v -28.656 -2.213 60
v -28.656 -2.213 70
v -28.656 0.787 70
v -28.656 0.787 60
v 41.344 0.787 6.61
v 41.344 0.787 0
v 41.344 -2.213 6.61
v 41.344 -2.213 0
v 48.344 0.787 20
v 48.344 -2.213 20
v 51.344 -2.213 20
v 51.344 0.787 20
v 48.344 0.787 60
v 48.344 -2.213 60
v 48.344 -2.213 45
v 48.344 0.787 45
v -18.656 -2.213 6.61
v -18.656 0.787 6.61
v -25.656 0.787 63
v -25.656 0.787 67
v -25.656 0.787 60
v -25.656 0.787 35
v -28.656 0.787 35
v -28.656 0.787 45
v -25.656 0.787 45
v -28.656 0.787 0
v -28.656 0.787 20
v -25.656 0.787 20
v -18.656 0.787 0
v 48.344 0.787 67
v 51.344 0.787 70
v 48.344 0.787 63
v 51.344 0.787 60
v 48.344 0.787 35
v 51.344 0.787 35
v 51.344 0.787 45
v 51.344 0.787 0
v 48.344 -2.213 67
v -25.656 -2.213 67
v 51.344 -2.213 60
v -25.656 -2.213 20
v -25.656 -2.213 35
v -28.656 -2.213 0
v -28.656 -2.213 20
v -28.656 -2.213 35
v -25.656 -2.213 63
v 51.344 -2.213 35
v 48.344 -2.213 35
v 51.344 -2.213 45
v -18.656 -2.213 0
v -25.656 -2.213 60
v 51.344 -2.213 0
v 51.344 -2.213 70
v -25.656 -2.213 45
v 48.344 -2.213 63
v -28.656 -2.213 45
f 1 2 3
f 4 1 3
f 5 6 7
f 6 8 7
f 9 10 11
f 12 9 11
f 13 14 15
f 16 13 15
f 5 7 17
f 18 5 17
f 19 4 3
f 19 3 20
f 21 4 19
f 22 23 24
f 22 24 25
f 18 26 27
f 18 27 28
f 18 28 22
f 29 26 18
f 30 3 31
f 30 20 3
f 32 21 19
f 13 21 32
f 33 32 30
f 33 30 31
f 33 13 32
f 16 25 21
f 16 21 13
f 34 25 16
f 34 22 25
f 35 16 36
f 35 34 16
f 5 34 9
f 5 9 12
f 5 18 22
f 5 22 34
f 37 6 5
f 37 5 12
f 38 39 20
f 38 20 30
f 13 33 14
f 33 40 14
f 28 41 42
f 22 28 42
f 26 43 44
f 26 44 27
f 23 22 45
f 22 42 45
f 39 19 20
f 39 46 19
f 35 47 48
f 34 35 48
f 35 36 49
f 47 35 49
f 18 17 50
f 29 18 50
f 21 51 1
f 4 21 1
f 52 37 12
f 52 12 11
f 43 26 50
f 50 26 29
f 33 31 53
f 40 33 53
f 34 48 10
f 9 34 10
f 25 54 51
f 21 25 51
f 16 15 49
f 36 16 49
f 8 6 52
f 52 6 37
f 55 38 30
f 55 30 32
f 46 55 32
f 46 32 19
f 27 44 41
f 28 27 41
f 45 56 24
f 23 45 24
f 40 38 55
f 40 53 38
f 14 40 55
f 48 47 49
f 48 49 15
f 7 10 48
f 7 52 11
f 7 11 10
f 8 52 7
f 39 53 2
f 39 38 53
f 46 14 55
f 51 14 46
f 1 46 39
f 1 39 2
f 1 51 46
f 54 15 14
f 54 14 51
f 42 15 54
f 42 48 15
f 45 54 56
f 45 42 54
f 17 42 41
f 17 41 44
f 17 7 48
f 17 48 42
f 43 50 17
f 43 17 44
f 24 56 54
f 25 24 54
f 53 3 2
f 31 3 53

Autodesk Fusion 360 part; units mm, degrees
sketch "Sketch1" plane through (0, 0, 0) normal (0, 0, 1) x (1, 0, 0)
  line L0 (-28.6561, 0.7869) -> (51.3439, 0.7869)
  line L1 (51.3439, 0.7869) -> (51.3439, -2.2131)
  line L2 (51.3439, -2.2131) -> (-28.6561, -2.2131)
  line L3 (-28.6561, -2.2131) -> (-28.6561, 0.7869)
  dimension "d1" = 3
  dimension "d2" = 80
extrude "Extrude1" add sketch "Sketch1" along normal blind 70
sketch "Sketch2" plane through (0, -2.2131, 0) normal (0, -1, 0) x (1, 0, 0)
  line L0 (-28.6561, 0) -> (51.3439, 0)
  line L1 (51.3439, 0) -> (51.3439, 70)
  line L2 (51.3439, 70) -> (-28.6561, 70)
  line L3 (-28.6561, 70) -> (-28.6561, 0)
  line L4 (-18.6561, 0) -> (41.3439, 0)
  line L5 (41.3439, 0) -> (41.3439, 6.61)
  line L6 (41.3439, 6.61) -> (-18.6561, 6.61)
  line L7 (-18.6561, 6.61) -> (-18.6561, 0)
  dimension "d5" = 10
  dimension "d6" = 60
extrude "Extrude2" cut sketch "Sketch2" against normal blind 15 contours L0 L4 L5 L6 L7
sketch "Sketch3" plane through (0, -2.2131, 0) normal (0, -1, 0) x (1, 0, 0)
  line L0 (-18.6561, 0) -> (-18.6561, 6.61)
  line L1 (-18.6561, 6.61) -> (41.3439, 6.61)
  line L2 (41.3439, 6.61) -> (41.3439, 0)
  line L3 (41.3439, 0) -> (51.3439, 0)
  line L4 (51.3439, 0) -> (51.3439, 70)
  line L5 (51.3439, 70) -> (-28.6561, 70)
  line L6 (-28.6561, 70) -> (-28.6561, 0)
  line L7 (-28.6561, 0) -> (-18.6561, 0)
  line L8 (59.8727, 60) -> (-42.4062, 60) construction
  line L9 (-42.8479, 45) -> (61.1574, 45) construction
  line L10 (63.7389, 35) -> (-40.2664, 35) construction
  line L11 (-40.2664, 20) -> (63.7389, 20) construction
  line L12 (48.3439, -12.0113) -> (48.3439, -4.8877)
  line L13 (48.3439, -4.8877) -> (48.3439, 80.5961) construction
  line L14 (-25.6561, 80.5961) -> (-25.6561, -19.135) construction
  line L15 (-25.6561, 60) -> (-28.6561, 60)
  line L16 (-28.6561, 60) -> (-28.6561, 45)
  line L17 (-28.6561, 45) -> (-25.6561, 45)
  line L18 (-25.6561, 45) -> (-25.6561, 60)
  line L19 (-25.6561, 35) -> (-28.6561, 35)
  line L20 (-28.6561, 35) -> (-28.6561, 20)
  line L21 (-28.6561, 20) -> (-25.6561, 20)
  line L22 (-25.6561, 20) -> (-25.6561, 35)
  line L23 (48.3439, 20) -> (51.3439, 20)
  line L24 (51.3439, 20) -> (51.3439, 35)
  line L25 (51.3439, 35) -> (48.3439, 35)
  line L26 (48.3439, 35) -> (48.3439, 20)
  line L27 (48.3439, 45) -> (51.3439, 45)
  line L28 (51.3439, 45) -> (51.3439, 60)
  line L29 (51.3439, 60) -> (48.3439, 60)
  line L30 (48.3439, 60) -> (48.3439, 45)
  line L31 (-25.6561, 67) -> (48.3439, 67)
  line L32 (48.3439, 67) -> (48.3439, 63)
  line L33 (48.3439, 63) -> (-25.6561, 63)
  line L34 (-25.6561, 63) -> (-25.6561, 67)
  dimension "d9" = 3
  dimension "d10" = 3
  dimension "d11" = 10
  dimension "d12" = 15
  dimension "d13" = 10
  dimension "d14" = 15
  dimension "d17" = 4
  dimension "d18" = 3
extrude "Extrude3" cut sketch "Sketch3" against normal blind 10 contours L6 L19 L20 L21 L22 | L6 L15 L16 L17 L18 | L4 L23 L24 L25 L26 | L4 L27 L28 L29 L30 | L31 L32 L33 L34
